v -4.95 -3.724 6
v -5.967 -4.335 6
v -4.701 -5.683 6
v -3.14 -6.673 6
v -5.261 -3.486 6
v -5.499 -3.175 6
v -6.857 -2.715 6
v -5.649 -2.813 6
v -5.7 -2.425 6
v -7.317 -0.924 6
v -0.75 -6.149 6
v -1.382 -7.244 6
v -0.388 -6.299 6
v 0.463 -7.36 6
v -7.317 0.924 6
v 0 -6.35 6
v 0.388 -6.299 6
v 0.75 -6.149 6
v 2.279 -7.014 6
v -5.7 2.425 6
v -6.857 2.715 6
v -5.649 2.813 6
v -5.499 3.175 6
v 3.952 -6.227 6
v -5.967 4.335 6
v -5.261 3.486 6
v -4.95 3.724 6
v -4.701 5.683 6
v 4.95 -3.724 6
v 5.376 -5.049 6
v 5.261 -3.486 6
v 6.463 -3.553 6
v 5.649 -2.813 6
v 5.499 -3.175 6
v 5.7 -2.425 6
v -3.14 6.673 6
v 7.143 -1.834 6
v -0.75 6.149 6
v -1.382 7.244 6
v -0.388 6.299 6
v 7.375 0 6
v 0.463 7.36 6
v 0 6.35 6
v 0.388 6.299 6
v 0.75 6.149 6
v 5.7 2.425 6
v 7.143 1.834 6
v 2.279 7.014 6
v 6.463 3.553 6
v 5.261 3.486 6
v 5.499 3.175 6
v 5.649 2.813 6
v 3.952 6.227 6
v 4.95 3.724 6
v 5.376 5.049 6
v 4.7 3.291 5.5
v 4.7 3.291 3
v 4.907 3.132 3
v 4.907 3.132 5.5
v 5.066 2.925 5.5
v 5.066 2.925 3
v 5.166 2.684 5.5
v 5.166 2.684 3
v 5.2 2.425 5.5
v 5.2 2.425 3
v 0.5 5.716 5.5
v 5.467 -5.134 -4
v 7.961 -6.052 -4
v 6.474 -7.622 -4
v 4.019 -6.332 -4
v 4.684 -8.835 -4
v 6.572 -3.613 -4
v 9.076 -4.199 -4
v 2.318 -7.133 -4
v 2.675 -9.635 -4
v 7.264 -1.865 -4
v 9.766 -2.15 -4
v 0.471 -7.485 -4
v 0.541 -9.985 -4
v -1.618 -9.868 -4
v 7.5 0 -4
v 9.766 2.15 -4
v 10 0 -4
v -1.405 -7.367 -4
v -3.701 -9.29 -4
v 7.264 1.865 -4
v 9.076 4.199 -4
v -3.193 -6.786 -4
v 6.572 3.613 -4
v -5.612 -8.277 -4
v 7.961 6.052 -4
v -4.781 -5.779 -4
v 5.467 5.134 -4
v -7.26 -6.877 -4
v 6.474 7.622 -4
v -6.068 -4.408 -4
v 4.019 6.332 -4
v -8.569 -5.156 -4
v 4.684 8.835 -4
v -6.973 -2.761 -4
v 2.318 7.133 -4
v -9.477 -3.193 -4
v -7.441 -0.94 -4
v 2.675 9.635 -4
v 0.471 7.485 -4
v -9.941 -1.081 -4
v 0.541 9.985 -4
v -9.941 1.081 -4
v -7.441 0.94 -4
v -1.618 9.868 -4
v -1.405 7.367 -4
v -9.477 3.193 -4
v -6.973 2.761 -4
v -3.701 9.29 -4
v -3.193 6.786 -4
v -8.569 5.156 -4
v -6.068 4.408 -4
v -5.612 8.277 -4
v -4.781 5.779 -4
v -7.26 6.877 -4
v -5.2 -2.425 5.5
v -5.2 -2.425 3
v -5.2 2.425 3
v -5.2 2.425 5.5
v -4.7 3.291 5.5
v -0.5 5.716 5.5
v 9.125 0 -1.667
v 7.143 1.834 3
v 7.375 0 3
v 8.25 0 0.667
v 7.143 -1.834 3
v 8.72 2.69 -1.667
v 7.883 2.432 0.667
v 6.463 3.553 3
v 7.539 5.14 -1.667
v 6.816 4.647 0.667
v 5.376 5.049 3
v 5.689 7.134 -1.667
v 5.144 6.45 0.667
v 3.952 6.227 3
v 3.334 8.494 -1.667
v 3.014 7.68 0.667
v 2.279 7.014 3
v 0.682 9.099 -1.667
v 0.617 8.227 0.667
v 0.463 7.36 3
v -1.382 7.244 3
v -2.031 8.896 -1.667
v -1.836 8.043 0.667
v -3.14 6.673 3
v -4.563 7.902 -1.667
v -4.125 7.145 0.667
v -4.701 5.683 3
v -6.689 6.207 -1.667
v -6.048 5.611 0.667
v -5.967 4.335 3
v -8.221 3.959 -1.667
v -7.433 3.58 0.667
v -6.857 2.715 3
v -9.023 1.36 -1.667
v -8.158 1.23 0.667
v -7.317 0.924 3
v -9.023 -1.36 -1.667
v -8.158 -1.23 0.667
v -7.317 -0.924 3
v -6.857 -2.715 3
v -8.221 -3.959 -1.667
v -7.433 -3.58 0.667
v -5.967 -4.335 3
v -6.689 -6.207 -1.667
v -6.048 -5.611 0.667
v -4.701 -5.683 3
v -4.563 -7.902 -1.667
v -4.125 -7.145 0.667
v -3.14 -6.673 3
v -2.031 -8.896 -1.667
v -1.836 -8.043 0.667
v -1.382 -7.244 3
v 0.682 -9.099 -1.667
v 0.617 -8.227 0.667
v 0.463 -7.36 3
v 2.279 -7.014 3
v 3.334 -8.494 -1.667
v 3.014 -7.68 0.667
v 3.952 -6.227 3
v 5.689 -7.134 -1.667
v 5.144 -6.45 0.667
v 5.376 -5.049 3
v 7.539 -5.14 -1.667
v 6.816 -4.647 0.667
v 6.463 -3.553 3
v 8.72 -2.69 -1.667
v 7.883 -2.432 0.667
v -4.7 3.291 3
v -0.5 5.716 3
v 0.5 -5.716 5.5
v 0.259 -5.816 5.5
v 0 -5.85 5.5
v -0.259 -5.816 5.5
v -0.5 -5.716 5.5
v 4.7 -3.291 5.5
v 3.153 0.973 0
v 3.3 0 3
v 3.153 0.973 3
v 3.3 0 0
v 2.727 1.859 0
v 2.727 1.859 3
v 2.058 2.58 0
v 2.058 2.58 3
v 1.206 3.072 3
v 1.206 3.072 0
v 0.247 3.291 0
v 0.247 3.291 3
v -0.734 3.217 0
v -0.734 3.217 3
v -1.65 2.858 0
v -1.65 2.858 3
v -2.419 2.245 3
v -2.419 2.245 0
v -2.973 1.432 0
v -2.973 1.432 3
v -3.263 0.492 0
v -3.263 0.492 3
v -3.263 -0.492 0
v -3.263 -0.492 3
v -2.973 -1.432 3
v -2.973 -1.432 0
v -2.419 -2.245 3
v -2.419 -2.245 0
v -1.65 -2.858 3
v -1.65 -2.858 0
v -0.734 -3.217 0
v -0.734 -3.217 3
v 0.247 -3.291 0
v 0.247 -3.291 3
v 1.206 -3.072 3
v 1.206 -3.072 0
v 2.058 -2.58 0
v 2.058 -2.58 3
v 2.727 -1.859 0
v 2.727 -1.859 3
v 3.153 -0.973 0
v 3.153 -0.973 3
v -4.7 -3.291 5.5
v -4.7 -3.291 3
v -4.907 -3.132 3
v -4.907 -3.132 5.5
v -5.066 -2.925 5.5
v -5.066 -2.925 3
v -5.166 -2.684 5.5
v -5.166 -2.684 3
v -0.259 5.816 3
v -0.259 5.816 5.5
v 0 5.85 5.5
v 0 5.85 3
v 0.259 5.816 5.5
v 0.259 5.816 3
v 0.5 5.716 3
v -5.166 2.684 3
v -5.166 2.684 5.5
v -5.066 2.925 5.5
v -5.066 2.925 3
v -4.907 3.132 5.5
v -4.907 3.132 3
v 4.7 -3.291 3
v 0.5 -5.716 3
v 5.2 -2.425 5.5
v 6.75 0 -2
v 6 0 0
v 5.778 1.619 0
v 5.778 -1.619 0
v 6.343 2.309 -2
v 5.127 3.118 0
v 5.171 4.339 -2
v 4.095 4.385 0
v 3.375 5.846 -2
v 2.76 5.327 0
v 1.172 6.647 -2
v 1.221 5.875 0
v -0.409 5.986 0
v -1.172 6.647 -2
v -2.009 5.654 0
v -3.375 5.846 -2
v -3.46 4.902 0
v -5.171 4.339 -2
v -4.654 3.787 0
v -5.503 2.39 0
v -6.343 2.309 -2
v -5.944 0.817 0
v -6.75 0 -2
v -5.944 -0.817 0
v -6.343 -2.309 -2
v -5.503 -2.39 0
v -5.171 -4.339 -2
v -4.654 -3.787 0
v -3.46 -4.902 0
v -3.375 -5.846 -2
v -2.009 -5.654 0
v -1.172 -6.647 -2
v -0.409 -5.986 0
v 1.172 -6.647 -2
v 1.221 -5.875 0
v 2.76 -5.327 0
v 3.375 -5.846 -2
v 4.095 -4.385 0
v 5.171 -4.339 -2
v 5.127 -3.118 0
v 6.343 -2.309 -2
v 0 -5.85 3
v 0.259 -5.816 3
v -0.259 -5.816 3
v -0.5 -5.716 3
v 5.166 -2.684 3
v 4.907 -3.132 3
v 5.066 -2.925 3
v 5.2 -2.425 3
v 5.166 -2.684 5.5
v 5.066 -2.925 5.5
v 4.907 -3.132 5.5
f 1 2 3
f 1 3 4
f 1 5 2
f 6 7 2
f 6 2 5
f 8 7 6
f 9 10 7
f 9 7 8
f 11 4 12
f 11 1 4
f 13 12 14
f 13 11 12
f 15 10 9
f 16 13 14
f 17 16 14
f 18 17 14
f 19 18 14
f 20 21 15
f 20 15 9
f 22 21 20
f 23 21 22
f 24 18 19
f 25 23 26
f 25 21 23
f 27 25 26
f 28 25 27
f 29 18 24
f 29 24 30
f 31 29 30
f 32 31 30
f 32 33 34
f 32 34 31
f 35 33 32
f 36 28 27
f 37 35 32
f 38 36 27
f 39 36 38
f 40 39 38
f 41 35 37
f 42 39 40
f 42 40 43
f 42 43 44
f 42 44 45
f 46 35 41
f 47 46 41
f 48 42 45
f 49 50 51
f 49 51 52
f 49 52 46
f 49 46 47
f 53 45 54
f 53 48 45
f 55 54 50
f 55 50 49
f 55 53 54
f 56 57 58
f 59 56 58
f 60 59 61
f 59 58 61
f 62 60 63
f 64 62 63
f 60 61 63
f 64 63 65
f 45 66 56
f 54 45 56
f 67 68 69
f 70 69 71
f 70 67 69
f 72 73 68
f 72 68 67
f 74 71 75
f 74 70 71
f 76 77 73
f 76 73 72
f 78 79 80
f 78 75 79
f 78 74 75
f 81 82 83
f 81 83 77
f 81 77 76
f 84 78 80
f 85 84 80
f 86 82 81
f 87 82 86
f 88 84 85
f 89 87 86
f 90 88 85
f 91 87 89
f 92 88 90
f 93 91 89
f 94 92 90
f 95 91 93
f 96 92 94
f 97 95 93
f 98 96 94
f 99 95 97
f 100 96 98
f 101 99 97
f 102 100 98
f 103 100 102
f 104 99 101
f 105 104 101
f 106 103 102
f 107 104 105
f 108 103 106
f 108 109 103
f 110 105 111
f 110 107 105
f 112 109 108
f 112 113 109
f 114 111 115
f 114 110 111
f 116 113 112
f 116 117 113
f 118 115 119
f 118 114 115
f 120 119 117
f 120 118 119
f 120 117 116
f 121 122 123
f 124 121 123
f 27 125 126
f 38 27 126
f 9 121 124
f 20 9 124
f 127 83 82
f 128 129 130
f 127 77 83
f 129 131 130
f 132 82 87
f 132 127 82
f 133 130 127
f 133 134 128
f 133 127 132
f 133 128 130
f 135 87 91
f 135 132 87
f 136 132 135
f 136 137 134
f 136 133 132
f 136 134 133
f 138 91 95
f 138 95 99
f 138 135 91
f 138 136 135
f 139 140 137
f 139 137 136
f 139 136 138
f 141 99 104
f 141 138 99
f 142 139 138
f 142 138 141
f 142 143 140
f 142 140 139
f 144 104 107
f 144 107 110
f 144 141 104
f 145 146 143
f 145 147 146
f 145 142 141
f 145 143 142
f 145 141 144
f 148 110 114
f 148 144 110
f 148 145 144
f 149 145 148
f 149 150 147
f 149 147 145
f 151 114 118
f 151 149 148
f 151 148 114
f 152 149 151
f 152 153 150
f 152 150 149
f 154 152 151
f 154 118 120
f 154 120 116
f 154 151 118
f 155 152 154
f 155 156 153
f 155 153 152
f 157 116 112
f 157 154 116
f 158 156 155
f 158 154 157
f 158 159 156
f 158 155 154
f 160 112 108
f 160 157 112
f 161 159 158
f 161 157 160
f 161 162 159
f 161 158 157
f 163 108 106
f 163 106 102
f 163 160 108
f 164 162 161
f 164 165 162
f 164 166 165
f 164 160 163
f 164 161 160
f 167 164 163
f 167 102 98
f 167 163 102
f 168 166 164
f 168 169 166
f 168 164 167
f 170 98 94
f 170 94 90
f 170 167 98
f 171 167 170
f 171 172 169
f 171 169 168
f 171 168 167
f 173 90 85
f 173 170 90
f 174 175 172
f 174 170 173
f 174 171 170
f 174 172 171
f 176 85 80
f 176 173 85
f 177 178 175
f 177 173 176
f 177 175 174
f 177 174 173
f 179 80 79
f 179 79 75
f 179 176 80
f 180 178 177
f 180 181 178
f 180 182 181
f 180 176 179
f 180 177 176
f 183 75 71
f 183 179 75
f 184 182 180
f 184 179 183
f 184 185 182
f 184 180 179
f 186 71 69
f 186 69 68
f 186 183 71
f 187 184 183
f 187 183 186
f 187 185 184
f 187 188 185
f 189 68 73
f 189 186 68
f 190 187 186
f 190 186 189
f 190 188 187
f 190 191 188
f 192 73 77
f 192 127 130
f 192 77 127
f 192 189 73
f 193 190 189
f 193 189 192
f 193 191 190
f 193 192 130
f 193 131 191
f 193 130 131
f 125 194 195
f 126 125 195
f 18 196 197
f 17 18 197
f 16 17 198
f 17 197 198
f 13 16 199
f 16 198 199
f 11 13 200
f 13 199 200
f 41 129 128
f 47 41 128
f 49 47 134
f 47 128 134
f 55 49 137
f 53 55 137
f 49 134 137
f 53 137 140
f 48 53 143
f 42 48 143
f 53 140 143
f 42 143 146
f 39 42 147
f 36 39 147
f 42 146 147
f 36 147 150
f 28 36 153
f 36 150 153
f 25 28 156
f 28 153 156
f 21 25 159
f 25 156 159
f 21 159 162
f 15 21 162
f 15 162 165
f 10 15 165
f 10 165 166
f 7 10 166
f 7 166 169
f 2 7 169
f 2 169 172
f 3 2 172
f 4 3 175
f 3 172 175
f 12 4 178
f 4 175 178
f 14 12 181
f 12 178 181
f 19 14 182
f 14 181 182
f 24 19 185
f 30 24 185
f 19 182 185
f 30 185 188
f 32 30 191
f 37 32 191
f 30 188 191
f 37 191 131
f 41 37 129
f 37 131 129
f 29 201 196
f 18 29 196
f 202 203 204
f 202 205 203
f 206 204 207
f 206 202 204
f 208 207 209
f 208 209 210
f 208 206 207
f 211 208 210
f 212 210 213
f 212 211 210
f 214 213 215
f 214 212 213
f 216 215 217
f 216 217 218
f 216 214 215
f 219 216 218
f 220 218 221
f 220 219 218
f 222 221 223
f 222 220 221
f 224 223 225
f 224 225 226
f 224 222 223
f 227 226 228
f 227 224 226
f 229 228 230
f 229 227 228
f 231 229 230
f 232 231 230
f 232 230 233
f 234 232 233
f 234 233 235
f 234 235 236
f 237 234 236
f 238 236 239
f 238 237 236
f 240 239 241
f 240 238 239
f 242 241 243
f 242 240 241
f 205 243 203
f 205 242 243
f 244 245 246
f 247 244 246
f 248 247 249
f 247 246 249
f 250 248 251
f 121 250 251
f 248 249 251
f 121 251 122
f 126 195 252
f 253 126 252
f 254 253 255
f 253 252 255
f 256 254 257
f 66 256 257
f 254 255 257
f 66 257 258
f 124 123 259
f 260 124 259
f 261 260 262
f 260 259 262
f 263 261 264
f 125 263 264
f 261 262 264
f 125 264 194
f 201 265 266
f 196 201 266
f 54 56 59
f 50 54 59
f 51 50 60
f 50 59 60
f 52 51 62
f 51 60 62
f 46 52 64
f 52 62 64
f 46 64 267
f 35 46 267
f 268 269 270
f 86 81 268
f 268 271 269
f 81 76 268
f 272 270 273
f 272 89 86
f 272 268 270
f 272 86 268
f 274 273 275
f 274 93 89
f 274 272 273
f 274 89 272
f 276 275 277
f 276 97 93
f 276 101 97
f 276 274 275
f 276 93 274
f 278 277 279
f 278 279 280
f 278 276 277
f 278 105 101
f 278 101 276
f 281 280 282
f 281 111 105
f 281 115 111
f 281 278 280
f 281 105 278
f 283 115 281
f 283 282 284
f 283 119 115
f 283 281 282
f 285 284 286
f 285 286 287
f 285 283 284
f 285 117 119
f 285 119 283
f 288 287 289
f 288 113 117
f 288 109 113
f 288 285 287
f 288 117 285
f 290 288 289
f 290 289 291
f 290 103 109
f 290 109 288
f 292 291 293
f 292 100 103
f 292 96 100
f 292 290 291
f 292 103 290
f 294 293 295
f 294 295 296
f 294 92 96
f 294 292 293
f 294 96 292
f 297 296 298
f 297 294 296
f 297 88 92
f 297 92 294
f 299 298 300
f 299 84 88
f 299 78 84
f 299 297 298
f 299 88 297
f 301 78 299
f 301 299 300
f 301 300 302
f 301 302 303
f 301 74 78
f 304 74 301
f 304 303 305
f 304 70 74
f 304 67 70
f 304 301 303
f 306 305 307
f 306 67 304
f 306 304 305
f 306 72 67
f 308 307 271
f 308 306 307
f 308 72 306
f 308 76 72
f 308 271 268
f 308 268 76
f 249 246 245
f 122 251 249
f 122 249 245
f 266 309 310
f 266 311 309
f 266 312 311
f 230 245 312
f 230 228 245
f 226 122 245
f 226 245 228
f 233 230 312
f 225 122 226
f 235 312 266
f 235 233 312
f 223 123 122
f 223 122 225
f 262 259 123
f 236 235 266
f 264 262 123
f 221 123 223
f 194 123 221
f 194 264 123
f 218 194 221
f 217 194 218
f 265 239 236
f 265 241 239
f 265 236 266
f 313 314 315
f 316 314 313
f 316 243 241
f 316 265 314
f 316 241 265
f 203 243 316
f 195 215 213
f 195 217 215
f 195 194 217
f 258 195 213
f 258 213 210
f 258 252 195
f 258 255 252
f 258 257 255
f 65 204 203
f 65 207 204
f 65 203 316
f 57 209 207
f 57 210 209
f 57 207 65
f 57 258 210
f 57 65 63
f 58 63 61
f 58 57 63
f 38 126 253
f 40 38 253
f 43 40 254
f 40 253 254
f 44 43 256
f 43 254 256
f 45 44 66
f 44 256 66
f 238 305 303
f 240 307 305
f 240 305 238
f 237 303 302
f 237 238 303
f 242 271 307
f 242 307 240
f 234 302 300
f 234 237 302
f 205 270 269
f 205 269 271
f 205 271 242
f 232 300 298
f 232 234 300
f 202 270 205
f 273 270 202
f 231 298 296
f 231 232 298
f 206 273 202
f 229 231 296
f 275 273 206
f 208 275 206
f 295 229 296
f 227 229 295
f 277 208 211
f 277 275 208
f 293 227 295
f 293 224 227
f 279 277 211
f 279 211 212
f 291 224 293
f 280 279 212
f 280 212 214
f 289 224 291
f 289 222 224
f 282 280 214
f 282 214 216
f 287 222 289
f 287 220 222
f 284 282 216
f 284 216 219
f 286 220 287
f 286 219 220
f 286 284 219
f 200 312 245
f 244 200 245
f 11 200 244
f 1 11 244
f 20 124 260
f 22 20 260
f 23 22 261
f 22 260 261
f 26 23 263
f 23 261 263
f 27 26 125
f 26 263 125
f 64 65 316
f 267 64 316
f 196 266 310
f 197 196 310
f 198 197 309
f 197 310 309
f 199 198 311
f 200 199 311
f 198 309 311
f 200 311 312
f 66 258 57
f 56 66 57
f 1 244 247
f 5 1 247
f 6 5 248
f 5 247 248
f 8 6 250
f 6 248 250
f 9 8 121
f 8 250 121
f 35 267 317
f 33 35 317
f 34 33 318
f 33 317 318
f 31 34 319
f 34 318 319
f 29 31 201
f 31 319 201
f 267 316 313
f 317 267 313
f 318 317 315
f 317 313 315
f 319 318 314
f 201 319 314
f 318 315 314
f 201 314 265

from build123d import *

# Parameters (mm, degrees)
F2_R     = 7.375
F3_DEPTH = 3
F4_SIZE  = 0.5


with BuildPart() as f1:
    # F0 (on Front) → F1 (revolve)
    with BuildSketch(Plane.XZ):
        Polygon((7.375, 3), (3.3, 3), (3.3, 0), (6, 0), (7.5, -4), (10, -4), align=None)
    revolve(axis=Axis((0, 0, -0.17444), (0, 0, 1)))

    # F2 (on face) → F3 (join)
    with BuildSketch(Plane.XY.offset(3)):
        Circle(F2_R)
        with BuildLine():
            ThreePointArc((-0.5, 5.715768), (0, 5.849742), (0.5, 5.715768))
            Line((0.5, 5.715768), (4.7, 3.290897))
            ThreePointArc((4.7, 3.290897), (5.066025, 2.924871), (5.2, 2.424871))
            Line((5.2, 2.424871), (5.2, -2.424871))
            ThreePointArc((5.2, -2.424871), (5.066025, -2.924871), (4.7, -3.290897))
            Line((4.7, -3.290897), (0.5, -5.715768))
            ThreePointArc((0.5, -5.715768), (0, -5.849742), (-0.5, -5.715768))
            Line((-0.5, -5.715768), (-4.7, -3.290897))
            ThreePointArc((-4.7, -3.290897), (-5.066025, -2.924871), (-5.2, -2.424871))
            Line((-5.2, -2.424871), (-5.2, 2.424871))
            ThreePointArc((-5.2, 2.424871), (-5.066025, 2.924871), (-4.7, 3.290897))
            Line((-4.7, 3.290897), (-0.5, 5.715768))
        make_face(mode=Mode.SUBTRACT)
    extrude(amount=F3_DEPTH)

    # F4
    f4_edges = [f1.edges().sort_by_distance(p)[0] for p in [
        (-5.2, 0, 6),
    ]]
    chamfer(f4_edges, length=F4_SIZE)


solid = f1.part
